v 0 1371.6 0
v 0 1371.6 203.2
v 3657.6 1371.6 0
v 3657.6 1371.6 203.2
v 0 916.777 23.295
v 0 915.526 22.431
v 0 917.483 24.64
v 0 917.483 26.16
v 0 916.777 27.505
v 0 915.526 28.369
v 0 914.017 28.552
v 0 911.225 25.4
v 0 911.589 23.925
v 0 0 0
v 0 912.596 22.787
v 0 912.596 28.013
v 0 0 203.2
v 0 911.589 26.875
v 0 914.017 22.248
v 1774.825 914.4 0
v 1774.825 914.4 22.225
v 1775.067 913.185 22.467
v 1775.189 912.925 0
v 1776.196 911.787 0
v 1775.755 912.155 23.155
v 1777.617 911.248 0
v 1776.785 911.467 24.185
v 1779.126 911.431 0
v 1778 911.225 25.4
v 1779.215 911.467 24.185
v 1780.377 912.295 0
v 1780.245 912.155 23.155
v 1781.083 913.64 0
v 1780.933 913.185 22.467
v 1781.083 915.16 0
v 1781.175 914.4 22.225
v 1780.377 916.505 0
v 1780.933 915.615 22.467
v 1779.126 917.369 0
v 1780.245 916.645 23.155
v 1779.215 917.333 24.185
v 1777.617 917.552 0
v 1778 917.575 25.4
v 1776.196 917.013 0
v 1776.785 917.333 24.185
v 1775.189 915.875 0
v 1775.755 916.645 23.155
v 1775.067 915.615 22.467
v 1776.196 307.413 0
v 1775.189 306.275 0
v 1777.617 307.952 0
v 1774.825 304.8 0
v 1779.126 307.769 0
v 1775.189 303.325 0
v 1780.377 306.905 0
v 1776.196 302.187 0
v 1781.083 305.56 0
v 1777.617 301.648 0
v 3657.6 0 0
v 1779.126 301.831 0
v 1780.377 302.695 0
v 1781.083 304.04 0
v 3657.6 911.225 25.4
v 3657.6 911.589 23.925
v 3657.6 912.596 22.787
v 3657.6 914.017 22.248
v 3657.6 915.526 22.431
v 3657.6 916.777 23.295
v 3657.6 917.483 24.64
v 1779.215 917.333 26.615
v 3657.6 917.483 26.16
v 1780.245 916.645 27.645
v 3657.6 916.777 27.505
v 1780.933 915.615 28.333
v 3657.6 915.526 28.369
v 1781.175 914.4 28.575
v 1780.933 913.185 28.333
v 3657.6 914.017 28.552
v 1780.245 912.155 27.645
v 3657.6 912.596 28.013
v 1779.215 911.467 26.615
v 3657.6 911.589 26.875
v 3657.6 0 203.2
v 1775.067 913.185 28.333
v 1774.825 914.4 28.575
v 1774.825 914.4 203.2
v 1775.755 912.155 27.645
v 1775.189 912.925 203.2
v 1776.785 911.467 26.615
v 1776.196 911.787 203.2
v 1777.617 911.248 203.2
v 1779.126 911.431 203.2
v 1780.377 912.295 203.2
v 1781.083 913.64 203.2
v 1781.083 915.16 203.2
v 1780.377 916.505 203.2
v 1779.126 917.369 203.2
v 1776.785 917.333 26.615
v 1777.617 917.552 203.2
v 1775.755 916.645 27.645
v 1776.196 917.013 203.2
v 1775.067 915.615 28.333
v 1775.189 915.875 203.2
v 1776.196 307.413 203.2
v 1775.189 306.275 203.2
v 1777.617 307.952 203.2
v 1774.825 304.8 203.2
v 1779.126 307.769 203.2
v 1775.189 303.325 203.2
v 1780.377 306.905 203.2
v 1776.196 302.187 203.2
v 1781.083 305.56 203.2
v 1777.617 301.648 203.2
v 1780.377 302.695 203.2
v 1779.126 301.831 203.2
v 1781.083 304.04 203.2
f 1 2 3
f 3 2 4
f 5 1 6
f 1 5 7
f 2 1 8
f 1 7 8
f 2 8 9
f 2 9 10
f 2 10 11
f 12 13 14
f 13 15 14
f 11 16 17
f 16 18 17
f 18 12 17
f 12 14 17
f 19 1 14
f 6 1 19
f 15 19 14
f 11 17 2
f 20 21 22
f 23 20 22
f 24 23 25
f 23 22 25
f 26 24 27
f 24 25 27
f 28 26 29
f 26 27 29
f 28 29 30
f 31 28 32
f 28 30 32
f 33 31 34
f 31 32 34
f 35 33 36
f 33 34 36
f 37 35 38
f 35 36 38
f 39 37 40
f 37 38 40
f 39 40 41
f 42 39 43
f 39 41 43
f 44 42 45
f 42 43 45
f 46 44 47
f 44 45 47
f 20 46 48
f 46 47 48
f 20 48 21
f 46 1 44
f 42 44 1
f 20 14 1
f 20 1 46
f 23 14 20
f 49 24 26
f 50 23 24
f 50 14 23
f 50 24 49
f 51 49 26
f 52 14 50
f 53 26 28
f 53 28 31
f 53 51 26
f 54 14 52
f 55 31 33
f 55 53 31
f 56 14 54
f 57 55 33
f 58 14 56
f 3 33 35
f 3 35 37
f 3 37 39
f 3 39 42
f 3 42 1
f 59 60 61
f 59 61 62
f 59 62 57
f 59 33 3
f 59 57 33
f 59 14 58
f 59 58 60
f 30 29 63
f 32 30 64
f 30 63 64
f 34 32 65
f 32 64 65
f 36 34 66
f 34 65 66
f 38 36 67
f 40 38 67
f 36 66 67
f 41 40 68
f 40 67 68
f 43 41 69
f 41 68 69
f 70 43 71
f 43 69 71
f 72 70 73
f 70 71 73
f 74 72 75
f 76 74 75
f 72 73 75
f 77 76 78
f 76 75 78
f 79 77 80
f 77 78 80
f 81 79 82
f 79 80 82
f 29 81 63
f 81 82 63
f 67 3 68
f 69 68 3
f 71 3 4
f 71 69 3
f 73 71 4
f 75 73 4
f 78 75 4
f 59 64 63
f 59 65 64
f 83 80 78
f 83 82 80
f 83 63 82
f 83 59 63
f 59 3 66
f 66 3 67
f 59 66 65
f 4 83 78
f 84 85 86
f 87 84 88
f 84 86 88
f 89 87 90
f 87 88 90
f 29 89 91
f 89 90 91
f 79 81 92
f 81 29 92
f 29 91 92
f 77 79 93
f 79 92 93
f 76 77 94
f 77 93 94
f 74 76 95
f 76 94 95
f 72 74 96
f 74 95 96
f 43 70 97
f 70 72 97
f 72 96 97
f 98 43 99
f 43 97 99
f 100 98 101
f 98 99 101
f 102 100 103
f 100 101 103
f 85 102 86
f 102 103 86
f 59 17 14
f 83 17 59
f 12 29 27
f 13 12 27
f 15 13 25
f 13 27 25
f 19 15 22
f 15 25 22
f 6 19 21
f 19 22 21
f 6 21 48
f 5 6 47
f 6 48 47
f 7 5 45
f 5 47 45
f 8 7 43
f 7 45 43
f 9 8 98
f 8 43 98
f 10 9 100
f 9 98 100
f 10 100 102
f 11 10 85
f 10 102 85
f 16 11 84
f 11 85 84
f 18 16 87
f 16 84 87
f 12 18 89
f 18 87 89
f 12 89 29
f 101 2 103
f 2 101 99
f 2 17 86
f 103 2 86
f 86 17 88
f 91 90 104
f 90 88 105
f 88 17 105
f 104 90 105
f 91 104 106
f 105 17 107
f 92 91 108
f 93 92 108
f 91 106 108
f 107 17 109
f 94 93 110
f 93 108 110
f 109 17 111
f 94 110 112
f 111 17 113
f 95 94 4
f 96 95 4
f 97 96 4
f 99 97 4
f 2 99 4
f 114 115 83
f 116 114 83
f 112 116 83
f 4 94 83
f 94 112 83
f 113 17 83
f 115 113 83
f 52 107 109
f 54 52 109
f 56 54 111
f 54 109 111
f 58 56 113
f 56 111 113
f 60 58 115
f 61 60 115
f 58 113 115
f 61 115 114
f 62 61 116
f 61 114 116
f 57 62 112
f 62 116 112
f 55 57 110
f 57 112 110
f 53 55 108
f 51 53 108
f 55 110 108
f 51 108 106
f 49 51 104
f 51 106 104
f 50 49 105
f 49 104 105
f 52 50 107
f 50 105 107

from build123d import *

# Parameters (mm, degrees)
F0_W     = 3657.6
F0_H     = 203.2
F3_DEPTH = 1371.6
F4_D     = 6.35
F5_D     = 6.35
F6_D     = 6.35


with BuildPart() as f3:
    # F0 (on Front) → F3 (new body)
    with BuildSketch(Plane.XZ):
        with Locations((1828.8, 101.6)):
            Rectangle(F0_W, F0_H)
    extrude(amount=-F3_DEPTH)

    # F4 (through all)
    with Locations(Plane(origin=(0, 0, 0), x_dir=(0, 1, 0), z_dir=(-1, 0, 0))):
        with Locations((914.4, -25.4)):
            Hole(F4_D / 2)

    # F5 (through all)
    with Locations(Plane(origin=(0, 0, 0), x_dir=(1, 0, 0), z_dir=(0, 0, -1))):
        with Locations((1778, -304.8)):
            Hole(F5_D / 2)

    # F6 (through all)
    with Locations(Plane(origin=(0, 0, 0), x_dir=(1, 0, 0), z_dir=(0, 0, -1))):
        with Locations((1778, -914.4)):
            Hole(F6_D / 2)


solid = f3.part
